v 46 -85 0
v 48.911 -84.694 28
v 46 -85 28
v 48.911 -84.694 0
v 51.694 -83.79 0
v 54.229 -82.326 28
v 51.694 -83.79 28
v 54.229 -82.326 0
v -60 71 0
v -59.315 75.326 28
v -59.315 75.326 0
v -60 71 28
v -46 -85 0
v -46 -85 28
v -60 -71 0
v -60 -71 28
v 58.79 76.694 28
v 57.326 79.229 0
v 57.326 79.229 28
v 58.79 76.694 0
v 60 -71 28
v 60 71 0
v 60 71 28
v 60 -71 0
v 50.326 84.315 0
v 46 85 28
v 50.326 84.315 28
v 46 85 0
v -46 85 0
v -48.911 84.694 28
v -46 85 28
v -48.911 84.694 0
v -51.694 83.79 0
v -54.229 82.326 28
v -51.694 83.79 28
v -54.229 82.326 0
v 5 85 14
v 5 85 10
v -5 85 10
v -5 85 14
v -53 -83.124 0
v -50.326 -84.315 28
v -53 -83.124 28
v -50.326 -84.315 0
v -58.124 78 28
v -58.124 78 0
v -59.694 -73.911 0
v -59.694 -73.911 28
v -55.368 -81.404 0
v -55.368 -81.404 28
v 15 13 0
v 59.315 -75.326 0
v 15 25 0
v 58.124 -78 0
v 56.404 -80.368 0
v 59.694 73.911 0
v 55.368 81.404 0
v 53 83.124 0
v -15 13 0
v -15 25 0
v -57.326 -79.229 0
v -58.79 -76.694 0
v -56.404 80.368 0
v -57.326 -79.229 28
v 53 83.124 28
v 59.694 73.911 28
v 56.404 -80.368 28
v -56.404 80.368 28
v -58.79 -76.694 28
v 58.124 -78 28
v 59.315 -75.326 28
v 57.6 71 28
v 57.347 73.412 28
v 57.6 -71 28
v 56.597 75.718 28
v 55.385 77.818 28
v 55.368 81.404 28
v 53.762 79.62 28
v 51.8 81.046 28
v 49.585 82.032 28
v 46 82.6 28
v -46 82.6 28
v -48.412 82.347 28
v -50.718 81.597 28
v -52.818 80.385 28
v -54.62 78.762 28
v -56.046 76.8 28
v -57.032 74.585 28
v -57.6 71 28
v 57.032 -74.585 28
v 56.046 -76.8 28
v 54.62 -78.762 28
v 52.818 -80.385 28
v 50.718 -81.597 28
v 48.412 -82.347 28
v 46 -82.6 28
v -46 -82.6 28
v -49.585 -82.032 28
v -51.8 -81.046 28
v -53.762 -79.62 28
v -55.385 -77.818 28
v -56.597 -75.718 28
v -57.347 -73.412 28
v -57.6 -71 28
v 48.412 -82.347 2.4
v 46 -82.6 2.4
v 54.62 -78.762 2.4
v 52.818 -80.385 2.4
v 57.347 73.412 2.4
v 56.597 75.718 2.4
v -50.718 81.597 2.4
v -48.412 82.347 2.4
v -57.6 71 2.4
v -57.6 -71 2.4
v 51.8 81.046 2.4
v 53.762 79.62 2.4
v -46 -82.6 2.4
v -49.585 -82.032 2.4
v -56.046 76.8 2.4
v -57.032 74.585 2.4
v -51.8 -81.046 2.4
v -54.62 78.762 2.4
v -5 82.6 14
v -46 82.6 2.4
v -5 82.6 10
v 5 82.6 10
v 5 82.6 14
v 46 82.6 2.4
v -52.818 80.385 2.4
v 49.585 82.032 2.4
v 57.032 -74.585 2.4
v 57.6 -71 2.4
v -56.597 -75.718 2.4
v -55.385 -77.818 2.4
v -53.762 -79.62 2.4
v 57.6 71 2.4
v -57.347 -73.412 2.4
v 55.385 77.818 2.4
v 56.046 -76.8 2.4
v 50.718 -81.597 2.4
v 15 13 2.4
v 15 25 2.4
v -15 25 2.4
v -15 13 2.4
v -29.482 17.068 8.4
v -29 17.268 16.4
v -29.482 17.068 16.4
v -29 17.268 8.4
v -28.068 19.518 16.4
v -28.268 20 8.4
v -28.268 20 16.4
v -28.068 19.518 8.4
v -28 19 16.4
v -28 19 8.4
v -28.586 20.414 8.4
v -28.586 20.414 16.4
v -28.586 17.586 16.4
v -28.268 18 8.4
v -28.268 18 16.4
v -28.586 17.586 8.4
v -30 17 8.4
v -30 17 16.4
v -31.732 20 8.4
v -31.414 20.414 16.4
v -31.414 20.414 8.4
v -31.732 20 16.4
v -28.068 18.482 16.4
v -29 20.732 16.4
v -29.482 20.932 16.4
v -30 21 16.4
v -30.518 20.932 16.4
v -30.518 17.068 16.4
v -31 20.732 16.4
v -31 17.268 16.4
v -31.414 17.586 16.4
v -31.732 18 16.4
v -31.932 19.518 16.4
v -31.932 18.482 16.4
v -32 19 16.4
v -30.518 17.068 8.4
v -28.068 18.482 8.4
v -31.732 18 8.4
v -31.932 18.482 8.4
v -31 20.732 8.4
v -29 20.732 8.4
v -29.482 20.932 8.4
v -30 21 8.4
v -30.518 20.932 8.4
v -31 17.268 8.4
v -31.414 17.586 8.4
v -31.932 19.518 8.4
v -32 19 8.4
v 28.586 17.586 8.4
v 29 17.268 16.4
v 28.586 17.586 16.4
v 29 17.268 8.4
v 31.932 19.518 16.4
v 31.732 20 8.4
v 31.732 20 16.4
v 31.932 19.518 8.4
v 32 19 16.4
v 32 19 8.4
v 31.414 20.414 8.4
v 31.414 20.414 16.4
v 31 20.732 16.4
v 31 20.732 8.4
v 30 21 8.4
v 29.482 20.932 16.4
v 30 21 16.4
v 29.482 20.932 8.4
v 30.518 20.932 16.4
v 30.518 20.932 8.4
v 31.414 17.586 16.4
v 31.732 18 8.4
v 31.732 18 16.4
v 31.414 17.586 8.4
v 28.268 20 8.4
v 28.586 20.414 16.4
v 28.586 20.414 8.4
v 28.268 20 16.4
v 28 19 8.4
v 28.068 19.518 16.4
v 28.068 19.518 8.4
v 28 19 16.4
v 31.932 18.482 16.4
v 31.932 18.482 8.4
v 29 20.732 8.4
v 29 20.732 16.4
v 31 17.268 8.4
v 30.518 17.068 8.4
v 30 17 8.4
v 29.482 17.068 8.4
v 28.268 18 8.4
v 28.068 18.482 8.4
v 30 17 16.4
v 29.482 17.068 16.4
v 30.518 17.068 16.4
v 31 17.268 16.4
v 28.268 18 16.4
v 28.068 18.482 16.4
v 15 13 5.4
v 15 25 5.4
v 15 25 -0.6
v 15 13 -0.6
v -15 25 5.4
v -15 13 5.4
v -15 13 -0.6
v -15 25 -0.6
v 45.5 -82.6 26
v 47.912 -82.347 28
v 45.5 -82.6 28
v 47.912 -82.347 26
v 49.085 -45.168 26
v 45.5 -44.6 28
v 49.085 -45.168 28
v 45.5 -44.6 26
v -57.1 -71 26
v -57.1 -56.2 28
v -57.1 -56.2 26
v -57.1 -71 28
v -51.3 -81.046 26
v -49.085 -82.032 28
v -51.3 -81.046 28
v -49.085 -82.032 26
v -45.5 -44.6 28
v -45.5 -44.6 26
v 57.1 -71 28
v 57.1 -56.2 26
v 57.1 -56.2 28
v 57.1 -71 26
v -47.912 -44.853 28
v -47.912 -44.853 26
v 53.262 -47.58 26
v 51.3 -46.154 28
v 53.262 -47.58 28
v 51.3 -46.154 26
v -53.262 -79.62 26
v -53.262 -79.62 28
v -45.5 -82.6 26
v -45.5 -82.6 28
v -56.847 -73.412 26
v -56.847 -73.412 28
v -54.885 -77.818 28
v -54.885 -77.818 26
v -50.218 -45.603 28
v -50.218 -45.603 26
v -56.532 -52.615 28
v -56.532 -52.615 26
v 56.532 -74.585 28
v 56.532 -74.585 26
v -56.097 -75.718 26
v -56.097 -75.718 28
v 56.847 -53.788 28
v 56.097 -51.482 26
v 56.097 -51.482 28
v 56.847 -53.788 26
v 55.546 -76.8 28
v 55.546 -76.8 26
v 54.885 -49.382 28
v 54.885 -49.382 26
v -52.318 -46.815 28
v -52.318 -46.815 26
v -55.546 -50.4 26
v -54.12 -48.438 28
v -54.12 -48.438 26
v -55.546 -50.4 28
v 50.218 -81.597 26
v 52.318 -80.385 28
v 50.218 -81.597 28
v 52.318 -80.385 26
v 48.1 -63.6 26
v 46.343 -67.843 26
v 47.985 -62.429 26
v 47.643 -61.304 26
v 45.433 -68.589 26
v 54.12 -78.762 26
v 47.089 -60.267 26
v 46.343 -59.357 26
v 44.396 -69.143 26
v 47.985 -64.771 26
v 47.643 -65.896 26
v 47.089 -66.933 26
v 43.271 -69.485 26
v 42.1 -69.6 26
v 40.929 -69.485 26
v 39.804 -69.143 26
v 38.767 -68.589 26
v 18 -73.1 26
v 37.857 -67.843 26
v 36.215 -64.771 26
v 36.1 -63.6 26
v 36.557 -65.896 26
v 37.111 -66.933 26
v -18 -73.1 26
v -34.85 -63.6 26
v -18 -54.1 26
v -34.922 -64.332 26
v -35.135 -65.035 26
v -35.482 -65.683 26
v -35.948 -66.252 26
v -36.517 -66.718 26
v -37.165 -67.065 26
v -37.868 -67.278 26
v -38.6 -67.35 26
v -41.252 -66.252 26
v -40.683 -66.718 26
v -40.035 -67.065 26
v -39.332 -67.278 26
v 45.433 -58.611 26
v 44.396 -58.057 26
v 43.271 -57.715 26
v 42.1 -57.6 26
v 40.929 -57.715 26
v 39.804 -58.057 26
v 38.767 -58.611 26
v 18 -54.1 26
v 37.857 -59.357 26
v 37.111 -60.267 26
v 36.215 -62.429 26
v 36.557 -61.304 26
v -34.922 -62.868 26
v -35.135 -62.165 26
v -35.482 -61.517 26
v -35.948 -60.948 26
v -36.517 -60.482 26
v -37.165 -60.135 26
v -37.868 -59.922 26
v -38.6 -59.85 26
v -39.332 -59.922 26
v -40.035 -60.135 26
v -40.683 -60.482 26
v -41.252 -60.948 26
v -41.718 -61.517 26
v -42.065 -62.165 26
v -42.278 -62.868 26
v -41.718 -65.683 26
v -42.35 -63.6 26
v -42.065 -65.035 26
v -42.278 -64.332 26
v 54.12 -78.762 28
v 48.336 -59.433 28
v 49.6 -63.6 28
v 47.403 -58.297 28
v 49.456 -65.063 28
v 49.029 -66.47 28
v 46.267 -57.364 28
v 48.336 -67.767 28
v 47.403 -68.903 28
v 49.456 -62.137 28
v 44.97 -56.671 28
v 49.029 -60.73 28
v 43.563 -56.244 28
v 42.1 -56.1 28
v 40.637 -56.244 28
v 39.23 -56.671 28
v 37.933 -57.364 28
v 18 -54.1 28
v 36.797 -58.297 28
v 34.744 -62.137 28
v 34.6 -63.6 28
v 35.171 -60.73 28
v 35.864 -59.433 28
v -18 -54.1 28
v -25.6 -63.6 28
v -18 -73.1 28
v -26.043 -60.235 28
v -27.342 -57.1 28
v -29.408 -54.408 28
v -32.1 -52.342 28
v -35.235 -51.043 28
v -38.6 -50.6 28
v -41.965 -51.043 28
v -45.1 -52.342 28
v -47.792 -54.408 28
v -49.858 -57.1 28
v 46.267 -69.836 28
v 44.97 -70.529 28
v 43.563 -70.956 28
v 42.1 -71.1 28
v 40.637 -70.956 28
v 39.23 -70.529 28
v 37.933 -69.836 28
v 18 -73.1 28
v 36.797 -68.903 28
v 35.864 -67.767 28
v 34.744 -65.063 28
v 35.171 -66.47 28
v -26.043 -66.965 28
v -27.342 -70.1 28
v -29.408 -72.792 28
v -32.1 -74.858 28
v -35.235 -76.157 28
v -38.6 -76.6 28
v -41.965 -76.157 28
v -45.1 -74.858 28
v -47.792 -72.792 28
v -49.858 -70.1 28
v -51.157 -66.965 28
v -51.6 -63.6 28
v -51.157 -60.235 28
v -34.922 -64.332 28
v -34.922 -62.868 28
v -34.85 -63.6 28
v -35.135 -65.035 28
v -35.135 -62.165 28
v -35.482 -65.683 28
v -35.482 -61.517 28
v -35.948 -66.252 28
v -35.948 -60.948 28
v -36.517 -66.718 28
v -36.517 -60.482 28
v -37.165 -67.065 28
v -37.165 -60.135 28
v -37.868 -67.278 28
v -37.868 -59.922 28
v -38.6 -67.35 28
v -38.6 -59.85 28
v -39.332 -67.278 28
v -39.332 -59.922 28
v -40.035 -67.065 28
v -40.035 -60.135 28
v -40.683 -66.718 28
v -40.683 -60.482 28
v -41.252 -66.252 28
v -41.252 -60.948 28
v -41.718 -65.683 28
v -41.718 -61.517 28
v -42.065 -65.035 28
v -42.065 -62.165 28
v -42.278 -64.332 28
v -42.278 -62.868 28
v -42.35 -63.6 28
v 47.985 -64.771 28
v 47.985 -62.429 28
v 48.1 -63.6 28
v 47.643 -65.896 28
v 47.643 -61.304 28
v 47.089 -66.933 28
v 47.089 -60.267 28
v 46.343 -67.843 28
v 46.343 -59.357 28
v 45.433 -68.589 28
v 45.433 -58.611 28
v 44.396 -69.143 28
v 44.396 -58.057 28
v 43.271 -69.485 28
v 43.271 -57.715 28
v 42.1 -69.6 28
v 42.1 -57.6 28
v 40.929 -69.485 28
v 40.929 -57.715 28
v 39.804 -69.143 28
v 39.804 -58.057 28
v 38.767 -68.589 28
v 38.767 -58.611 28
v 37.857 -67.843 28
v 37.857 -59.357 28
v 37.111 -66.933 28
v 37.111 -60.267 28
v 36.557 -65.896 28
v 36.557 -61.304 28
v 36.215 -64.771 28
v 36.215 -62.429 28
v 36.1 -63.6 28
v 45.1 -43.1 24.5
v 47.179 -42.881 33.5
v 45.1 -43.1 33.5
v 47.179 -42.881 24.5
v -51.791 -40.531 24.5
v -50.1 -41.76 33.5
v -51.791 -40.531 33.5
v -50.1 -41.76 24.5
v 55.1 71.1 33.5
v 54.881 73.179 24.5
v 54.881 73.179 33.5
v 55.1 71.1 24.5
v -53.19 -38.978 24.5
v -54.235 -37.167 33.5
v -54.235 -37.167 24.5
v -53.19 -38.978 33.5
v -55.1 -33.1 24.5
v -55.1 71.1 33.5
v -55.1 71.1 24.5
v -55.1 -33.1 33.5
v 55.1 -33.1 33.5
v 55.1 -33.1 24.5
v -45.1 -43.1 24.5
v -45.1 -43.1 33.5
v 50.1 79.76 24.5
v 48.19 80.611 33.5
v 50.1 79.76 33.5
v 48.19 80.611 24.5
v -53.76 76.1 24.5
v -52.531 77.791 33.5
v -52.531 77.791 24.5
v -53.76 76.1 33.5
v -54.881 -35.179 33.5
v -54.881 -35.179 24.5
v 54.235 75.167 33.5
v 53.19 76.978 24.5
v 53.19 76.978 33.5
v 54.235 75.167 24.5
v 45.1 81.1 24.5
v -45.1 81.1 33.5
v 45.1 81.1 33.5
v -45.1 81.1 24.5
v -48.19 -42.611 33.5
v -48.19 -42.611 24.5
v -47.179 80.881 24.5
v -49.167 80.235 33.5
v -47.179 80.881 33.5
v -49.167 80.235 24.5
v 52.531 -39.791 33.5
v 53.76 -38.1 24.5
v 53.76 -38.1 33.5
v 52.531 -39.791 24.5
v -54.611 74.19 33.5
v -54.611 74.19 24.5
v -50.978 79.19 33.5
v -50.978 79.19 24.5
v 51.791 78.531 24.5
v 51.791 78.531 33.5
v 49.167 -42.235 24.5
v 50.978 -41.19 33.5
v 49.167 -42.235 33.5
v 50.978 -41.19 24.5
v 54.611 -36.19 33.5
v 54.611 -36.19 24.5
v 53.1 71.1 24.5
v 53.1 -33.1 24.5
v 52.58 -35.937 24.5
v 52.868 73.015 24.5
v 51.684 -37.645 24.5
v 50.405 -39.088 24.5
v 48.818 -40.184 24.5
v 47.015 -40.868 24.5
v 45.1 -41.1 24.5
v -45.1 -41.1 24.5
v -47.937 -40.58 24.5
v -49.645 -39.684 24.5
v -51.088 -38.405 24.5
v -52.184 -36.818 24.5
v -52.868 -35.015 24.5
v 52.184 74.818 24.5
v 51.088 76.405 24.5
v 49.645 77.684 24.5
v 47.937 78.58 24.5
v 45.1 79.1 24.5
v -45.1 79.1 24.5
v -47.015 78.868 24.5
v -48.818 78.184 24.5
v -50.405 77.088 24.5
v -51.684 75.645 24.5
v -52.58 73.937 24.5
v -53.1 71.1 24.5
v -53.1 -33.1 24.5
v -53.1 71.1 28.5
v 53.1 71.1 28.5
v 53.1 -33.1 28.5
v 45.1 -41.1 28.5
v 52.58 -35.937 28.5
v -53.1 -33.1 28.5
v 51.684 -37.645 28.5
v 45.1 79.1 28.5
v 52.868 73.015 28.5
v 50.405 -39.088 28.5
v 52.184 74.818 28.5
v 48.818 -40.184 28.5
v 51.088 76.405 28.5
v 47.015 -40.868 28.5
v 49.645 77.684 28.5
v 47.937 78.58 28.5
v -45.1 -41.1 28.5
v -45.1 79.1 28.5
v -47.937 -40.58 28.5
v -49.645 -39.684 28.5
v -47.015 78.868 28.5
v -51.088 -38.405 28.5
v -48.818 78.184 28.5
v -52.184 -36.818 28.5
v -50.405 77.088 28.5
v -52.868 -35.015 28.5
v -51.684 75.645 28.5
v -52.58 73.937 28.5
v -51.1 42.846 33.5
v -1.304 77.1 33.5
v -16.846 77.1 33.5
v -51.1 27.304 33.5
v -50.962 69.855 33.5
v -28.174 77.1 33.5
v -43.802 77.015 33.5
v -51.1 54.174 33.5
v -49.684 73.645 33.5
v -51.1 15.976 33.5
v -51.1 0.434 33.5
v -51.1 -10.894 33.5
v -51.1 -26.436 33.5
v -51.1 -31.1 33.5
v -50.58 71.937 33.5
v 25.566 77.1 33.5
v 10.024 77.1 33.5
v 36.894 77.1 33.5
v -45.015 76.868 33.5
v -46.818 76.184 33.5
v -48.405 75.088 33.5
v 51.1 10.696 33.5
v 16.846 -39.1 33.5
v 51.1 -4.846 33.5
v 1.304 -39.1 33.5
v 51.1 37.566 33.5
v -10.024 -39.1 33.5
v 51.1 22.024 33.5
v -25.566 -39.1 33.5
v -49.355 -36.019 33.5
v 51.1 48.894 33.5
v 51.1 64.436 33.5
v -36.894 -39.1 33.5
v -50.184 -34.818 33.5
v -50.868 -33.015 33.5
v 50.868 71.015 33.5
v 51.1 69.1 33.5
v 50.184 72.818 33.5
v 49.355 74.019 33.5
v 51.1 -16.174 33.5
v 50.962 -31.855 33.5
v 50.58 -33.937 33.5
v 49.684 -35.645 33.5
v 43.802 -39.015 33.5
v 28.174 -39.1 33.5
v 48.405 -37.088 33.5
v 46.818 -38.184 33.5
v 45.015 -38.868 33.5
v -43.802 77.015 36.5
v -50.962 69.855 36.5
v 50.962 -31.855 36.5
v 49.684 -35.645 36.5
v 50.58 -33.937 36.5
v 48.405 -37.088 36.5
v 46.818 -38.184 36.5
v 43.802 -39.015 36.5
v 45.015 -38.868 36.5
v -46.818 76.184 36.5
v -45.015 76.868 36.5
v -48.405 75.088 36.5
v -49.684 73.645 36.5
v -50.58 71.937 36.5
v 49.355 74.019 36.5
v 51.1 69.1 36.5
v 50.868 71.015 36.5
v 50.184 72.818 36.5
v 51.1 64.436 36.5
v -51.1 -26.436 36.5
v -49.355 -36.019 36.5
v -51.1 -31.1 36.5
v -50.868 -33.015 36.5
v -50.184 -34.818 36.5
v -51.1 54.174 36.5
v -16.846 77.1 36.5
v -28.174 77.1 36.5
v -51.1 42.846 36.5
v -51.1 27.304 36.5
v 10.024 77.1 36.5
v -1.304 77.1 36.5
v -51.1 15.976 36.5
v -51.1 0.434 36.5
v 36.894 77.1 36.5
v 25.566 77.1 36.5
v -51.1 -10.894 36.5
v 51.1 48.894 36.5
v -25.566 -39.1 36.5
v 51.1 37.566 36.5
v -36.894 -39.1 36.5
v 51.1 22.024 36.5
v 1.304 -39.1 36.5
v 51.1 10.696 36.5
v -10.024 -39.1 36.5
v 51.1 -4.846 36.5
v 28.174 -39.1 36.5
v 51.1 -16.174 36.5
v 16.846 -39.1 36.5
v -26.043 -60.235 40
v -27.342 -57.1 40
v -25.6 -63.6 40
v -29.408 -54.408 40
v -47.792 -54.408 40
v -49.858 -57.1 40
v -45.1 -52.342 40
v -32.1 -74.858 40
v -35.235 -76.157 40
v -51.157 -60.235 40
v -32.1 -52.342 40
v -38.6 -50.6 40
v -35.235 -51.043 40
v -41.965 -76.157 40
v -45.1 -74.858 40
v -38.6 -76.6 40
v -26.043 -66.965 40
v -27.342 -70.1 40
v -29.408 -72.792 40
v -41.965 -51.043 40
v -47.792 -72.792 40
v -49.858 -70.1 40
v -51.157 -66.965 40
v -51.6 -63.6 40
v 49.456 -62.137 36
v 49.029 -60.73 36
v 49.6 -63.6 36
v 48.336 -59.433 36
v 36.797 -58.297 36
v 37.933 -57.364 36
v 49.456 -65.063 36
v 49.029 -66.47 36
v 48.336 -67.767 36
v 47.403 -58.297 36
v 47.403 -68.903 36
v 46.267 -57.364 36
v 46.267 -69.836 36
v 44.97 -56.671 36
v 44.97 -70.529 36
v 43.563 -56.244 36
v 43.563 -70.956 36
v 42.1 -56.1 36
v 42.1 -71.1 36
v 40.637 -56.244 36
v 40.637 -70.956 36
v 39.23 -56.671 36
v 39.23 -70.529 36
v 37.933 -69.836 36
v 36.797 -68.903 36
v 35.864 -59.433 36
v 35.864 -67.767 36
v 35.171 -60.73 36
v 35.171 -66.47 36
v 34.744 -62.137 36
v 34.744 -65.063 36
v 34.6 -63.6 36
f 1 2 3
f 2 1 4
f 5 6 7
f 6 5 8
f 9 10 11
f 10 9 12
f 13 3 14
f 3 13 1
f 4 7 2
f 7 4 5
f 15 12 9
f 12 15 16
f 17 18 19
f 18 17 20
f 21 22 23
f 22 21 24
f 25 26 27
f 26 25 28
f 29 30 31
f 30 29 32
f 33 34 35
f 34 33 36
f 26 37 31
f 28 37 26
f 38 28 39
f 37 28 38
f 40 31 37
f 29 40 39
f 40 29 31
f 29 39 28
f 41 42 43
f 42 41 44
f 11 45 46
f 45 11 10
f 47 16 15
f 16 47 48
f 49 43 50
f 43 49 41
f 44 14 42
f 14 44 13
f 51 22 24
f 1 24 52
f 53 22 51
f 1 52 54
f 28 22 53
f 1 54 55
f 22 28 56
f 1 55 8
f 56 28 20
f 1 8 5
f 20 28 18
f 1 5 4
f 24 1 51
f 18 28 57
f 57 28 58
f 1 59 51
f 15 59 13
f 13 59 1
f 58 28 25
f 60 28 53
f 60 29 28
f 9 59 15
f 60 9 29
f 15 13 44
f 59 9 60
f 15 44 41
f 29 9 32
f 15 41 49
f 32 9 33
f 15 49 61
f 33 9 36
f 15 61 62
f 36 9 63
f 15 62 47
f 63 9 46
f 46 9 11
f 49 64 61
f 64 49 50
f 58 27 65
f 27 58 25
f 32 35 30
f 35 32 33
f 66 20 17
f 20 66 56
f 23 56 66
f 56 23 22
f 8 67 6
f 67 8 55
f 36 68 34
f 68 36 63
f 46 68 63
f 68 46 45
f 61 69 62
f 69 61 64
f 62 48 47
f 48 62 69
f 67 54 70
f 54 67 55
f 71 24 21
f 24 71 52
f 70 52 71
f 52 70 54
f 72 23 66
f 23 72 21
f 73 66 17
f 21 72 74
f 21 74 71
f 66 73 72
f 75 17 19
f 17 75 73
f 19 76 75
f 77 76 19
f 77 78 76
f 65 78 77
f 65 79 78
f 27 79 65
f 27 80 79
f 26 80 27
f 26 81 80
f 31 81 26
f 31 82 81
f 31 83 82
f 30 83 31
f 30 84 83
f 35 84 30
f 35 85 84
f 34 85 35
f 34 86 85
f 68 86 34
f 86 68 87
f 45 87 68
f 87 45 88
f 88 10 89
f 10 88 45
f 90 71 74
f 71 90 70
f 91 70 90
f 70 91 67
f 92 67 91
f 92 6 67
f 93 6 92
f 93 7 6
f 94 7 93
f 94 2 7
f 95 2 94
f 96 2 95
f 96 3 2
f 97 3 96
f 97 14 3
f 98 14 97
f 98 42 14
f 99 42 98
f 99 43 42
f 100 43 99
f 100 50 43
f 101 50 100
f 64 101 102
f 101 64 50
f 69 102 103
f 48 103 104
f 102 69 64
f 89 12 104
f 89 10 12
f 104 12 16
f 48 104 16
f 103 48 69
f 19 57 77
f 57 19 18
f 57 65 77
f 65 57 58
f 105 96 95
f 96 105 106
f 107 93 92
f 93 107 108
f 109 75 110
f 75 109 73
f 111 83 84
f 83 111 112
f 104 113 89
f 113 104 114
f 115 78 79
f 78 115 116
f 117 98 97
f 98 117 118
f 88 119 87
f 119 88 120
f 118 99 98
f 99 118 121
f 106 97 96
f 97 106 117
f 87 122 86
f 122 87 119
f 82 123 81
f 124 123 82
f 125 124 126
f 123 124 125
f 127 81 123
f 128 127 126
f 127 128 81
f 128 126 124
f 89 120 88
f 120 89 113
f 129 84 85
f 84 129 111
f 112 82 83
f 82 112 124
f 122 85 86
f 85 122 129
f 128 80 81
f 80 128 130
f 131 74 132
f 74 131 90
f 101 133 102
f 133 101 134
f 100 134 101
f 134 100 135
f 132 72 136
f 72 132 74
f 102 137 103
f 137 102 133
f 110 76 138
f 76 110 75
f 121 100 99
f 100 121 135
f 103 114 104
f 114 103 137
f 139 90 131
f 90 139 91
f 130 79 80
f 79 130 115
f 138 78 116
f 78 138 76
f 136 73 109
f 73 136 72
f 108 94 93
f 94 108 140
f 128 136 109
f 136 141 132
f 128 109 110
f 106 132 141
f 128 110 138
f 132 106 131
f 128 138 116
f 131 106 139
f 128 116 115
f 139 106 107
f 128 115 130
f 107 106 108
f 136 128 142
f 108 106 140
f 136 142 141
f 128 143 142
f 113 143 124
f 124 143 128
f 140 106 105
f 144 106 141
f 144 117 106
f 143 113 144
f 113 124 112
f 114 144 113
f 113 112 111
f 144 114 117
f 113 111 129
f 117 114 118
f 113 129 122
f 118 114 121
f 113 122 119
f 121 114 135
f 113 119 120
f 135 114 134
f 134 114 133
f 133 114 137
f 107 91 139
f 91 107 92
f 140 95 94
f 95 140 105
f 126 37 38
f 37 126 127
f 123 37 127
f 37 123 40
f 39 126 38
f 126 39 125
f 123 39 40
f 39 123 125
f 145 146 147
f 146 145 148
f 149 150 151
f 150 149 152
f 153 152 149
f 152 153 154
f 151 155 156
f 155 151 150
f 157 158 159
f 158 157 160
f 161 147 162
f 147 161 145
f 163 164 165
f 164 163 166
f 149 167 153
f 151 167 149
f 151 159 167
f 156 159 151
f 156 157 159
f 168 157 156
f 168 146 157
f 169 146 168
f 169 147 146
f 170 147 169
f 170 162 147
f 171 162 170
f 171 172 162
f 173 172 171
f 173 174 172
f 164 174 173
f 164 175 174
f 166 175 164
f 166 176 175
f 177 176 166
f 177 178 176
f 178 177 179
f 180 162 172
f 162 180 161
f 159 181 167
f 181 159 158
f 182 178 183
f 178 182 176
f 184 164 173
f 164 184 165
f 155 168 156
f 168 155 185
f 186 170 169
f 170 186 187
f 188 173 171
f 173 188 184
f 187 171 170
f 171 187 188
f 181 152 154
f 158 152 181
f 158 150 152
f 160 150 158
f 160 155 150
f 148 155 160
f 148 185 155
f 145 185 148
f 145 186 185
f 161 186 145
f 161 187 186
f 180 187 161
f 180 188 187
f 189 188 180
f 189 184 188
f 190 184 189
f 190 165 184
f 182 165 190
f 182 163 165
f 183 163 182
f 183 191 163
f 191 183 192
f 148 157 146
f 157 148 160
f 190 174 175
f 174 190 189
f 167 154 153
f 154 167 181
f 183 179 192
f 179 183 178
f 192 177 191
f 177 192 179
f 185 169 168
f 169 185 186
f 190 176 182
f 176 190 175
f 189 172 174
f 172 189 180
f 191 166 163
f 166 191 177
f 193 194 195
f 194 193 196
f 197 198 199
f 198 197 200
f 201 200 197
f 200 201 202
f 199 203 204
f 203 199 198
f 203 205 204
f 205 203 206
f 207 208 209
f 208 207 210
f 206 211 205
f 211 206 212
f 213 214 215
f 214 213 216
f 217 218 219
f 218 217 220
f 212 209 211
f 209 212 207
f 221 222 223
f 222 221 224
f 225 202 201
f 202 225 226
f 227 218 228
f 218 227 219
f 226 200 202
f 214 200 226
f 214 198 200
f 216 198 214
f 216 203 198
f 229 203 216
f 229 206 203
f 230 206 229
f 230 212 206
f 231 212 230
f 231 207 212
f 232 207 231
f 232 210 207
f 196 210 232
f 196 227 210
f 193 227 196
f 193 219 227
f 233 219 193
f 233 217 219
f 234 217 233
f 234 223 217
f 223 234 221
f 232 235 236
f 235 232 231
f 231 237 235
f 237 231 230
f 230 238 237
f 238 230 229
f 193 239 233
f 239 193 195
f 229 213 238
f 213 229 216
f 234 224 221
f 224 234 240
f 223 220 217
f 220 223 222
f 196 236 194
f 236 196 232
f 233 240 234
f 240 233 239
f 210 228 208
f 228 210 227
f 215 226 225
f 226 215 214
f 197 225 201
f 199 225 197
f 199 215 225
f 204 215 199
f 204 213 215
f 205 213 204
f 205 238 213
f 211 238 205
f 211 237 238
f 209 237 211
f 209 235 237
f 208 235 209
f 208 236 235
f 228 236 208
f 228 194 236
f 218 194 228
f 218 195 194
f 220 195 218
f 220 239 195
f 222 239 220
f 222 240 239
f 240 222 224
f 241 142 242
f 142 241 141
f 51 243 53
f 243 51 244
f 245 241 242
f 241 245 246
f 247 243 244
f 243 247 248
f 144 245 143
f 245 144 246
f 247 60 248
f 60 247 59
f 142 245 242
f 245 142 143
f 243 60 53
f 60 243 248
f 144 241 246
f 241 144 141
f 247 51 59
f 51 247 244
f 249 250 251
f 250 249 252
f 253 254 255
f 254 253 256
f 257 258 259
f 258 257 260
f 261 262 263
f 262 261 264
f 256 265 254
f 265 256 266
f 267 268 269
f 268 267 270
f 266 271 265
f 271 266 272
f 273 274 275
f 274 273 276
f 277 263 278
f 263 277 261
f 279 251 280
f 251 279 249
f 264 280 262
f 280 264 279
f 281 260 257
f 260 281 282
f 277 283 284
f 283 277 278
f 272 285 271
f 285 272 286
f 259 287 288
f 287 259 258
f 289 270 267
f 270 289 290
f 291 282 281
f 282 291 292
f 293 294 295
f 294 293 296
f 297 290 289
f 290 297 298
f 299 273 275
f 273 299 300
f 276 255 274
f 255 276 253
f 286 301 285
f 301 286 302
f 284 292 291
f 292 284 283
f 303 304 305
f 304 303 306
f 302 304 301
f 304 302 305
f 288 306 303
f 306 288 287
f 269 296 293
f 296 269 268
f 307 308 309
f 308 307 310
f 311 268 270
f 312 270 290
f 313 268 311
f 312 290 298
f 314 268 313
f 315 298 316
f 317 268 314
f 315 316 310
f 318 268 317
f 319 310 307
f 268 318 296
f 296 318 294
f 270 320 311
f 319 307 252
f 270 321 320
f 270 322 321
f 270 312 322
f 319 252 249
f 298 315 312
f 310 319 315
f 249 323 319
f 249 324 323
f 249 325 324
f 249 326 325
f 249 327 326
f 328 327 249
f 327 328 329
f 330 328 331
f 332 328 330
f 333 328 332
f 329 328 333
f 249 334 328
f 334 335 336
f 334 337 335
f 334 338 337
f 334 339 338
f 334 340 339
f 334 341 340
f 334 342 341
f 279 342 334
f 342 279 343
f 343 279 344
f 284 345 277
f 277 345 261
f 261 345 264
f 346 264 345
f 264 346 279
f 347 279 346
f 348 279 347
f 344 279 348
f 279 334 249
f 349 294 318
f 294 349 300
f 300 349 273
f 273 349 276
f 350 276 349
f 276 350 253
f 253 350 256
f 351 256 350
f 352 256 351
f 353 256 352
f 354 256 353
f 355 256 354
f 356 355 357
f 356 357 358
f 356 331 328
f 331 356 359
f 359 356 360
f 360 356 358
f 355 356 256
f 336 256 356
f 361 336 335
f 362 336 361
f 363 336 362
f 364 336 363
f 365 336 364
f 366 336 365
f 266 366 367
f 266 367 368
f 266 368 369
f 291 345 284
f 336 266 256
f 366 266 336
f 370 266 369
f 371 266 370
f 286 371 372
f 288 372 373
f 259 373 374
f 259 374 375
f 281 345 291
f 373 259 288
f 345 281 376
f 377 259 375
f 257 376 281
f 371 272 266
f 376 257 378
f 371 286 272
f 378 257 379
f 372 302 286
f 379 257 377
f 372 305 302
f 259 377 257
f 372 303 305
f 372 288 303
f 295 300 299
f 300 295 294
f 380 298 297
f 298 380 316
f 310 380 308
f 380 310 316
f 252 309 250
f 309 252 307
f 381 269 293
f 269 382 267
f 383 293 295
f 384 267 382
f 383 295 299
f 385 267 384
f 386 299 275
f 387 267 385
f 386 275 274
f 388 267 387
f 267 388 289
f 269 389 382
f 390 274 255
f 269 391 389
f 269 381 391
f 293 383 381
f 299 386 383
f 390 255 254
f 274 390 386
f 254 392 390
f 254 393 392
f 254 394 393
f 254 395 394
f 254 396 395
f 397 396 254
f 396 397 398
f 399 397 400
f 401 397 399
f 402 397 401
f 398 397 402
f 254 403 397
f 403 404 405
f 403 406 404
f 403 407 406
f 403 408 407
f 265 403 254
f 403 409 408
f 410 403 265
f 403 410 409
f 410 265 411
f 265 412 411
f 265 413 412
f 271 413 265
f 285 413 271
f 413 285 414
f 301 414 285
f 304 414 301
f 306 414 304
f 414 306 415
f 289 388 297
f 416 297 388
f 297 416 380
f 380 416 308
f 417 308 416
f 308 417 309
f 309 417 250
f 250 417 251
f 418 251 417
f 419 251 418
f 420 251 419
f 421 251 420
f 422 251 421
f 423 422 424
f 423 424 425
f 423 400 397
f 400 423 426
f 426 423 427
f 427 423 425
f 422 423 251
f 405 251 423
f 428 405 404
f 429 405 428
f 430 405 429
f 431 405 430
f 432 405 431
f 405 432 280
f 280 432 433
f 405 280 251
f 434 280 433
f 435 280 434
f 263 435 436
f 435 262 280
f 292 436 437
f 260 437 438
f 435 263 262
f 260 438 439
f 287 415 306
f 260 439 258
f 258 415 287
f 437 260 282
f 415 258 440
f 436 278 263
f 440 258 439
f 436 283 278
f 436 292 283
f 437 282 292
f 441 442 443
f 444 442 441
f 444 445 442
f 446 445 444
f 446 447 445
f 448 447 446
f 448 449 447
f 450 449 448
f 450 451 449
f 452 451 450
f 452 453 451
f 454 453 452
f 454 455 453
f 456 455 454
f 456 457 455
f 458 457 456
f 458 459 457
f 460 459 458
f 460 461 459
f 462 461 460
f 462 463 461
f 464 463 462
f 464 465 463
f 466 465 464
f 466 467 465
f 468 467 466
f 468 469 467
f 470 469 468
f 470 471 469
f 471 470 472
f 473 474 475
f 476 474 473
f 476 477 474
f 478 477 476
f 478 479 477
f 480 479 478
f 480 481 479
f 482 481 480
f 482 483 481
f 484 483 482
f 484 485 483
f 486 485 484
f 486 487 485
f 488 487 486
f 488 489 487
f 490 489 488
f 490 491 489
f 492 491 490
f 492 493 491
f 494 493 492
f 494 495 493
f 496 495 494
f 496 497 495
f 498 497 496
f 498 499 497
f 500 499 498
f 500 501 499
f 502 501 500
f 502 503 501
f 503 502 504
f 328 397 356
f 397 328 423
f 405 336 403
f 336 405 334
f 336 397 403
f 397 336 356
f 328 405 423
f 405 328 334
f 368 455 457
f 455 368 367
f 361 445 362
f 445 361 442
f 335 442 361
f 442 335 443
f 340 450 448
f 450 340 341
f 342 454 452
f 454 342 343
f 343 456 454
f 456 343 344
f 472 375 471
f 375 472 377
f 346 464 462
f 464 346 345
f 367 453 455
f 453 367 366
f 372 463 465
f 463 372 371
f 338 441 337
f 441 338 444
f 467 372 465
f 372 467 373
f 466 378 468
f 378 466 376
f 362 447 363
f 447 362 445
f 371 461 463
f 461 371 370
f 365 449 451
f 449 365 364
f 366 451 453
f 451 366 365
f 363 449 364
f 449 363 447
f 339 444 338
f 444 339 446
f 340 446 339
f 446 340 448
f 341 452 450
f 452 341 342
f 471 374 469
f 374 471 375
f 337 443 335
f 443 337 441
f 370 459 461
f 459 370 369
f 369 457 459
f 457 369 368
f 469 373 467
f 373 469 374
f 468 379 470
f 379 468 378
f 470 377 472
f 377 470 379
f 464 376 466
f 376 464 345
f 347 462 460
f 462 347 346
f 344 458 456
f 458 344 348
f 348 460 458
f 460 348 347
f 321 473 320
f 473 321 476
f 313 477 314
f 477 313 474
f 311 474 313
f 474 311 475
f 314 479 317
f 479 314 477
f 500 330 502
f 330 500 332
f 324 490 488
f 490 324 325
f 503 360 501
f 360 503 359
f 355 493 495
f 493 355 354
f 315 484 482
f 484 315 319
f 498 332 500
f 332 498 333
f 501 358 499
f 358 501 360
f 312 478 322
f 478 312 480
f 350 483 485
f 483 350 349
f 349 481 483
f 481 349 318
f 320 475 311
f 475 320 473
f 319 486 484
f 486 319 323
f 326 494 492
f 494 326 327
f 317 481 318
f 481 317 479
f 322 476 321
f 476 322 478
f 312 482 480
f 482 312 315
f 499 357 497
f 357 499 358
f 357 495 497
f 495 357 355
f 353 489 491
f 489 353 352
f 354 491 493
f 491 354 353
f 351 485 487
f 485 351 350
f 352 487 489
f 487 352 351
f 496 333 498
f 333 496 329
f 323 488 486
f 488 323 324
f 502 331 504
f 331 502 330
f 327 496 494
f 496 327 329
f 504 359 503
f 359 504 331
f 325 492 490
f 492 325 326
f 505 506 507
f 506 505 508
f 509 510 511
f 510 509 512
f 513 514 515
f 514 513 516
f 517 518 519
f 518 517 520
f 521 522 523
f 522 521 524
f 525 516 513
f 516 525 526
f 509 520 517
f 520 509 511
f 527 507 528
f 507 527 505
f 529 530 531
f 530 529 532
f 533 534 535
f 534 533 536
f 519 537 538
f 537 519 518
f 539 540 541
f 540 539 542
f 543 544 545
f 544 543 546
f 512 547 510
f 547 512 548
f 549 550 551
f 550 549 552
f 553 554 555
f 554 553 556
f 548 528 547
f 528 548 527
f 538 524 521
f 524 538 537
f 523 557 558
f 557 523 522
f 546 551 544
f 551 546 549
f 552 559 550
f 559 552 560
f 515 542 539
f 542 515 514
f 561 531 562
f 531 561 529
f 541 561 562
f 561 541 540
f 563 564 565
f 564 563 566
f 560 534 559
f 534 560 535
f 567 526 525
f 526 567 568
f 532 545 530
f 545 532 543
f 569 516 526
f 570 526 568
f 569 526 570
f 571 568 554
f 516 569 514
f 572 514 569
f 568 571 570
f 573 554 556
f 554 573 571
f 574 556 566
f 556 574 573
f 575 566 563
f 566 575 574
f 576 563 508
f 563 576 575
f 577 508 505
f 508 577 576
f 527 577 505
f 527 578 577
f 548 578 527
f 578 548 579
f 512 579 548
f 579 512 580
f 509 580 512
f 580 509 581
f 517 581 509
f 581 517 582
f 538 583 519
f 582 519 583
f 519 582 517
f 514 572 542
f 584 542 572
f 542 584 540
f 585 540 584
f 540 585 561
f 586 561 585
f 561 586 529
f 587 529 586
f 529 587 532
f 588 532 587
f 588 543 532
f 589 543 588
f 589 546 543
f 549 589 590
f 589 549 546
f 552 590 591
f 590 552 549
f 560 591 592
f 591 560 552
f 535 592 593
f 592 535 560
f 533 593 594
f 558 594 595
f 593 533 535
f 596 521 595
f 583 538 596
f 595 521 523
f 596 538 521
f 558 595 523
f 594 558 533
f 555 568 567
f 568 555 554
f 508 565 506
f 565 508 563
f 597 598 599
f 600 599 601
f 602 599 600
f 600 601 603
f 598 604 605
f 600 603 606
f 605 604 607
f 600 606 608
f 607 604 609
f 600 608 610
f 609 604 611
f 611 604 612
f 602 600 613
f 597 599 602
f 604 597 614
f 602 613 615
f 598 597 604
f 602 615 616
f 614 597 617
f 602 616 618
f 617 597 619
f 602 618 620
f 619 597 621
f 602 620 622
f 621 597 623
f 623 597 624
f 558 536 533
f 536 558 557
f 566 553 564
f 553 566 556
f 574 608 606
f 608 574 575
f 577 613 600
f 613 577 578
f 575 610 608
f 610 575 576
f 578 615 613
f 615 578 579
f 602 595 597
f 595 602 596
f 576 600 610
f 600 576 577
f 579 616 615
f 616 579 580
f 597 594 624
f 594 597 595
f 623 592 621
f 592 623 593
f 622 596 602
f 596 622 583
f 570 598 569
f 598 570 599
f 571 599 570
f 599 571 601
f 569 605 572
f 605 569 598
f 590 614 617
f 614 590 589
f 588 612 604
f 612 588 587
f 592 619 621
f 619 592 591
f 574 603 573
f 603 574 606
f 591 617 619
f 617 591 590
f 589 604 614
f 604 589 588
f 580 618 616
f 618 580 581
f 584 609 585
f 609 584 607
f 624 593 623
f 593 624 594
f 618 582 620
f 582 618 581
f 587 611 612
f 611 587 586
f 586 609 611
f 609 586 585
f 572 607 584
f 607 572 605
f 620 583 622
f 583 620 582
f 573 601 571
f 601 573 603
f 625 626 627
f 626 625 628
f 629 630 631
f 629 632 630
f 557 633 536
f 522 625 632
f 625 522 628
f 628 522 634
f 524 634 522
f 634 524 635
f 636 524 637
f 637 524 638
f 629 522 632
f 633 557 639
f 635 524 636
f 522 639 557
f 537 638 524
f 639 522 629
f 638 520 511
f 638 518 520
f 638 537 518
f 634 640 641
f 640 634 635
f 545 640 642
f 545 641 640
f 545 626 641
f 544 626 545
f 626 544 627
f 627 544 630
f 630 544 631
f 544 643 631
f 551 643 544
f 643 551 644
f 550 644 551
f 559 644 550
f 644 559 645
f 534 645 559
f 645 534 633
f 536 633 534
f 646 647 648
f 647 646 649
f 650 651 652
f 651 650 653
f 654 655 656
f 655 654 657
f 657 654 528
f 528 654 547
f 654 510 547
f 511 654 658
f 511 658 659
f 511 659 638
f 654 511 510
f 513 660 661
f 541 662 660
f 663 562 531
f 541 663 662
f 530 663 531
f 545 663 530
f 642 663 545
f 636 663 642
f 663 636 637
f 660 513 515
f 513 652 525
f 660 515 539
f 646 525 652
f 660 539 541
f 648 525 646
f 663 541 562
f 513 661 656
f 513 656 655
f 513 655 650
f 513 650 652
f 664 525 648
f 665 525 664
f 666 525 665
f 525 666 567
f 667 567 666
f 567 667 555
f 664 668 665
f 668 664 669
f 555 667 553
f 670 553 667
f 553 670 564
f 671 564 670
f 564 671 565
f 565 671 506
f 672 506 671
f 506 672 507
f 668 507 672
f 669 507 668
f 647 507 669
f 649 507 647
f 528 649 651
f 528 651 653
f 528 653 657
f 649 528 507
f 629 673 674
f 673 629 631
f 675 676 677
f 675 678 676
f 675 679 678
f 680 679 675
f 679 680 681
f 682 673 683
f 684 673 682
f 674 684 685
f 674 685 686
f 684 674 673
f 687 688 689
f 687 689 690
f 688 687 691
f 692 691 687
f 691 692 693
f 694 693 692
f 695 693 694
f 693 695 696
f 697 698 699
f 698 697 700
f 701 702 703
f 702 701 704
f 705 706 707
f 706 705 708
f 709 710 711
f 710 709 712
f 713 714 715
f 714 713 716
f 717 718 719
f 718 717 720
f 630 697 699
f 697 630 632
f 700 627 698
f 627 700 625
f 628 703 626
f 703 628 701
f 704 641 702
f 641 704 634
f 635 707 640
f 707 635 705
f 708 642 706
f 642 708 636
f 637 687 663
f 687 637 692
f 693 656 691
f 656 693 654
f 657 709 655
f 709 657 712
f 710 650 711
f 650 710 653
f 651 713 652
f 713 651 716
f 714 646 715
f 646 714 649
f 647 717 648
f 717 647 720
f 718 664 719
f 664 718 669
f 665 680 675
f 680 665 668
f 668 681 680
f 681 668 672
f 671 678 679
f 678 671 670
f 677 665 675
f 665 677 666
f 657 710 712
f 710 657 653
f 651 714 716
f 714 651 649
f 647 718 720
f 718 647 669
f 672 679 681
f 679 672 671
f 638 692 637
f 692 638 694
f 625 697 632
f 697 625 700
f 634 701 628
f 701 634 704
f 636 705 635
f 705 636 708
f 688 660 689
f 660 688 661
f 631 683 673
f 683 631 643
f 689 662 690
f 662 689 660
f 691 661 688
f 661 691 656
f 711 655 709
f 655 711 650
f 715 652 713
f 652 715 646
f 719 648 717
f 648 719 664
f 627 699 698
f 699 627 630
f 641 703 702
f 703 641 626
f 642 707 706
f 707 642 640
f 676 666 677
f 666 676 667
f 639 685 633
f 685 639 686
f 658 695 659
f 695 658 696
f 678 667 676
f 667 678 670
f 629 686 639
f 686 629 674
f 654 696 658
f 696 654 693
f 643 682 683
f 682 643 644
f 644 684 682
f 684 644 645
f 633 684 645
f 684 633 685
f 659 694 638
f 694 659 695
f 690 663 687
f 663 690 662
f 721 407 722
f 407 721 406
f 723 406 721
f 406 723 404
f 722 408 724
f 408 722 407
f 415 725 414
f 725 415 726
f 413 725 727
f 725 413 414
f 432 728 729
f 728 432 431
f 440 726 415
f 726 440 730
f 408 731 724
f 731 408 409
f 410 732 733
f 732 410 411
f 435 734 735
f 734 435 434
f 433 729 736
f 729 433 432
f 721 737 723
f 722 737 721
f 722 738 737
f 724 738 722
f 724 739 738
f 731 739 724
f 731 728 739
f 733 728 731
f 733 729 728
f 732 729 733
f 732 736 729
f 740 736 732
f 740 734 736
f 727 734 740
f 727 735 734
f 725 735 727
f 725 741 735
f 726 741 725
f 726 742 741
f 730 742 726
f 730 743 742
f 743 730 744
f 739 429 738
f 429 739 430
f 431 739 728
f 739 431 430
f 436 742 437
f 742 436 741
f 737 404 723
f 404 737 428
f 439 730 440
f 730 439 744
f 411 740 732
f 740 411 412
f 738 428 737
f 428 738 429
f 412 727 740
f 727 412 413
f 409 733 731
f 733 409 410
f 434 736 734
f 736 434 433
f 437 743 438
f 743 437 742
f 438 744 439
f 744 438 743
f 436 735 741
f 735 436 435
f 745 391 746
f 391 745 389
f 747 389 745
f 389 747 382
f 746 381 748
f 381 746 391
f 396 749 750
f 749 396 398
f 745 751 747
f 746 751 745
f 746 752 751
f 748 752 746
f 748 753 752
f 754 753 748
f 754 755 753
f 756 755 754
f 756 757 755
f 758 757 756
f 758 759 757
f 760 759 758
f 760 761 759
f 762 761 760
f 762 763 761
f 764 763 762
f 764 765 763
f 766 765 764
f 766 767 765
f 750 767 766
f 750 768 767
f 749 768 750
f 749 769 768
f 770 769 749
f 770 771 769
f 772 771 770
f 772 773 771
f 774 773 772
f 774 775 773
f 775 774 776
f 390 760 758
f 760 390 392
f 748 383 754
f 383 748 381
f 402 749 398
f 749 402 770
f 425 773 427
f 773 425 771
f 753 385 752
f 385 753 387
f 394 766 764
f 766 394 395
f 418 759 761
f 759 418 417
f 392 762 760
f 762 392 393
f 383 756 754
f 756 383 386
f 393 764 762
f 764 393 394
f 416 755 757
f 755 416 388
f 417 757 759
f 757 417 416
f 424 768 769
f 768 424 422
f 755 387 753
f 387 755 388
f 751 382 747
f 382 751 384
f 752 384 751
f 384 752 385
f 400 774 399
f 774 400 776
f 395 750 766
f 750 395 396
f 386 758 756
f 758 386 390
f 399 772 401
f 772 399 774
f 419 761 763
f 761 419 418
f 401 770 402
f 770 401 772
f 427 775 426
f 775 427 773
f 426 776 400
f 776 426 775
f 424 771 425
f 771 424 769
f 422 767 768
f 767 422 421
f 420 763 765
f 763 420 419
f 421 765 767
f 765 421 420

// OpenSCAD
// Báscula de café v2 - inspirada en la distribución del Water Tracker
// (plataforma con nervios + franja de control con pantalla, pomo y botón)
pieza = "todo"; // "base" | "panel" | "plataforma" | "nervios" | "pomo" | "boton" | "todo"

W = 120;  D = 170;  H = 28;  R = 14;   // carcasa
pared = 2.4;
panel_d = 38;                 // fondo de la franja de control (frente)
gap = 1.5;                    // holgura plataforma-panel
plat_w = W - 2*pared - 2*gap - 2;
plat_d = D - panel_d - 2*pared - 2*gap;
plat_t = 5;
// pantalla LCD 1.47" (172x320, vertical, se monta horizontal)
disp_w = 36; disp_h = 19;     // ventana visible
// pomo (encoder) y botón
pomo_d = 26; boton_d = 15;
nervio_w = 8; nervio_h = 3; paso = 19;

module rrect(w,d,h,r){ linear_extrude(h) offset(r) square([w-2*r,d-2*r],center=true); }

module base() {
  difference() {
    rrect(W,D,H,R);
    translate([0,0,pared]) rrect(W-2*pared,D-2*pared,H,R-pared);
    translate([0,D/2-1,12]) cube([10,8,4],center=true);        // USB-C trasero
  }
  // soporte celda de carga (zona de la plataforma)
  translate([0,(panel_d)/2,pared]) cube([30,12,6],center=true);
  // topes de sobrecarga
  for (x=[-1,1]) translate([x*30,panel_d/2,pared+6]) cylinder(d=4,h=8,$fn=24);
}

module panel() {   // pieza negra del frente, al ras de la carcasa
  translate([0,-D/2+panel_d/2+pared,H-2]) difference() {
    rrect(W-2*pared-1, panel_d, 2, R-pared);
    translate([0,0,-1]) cube([disp_w,disp_h,6],center=true);                    // pantalla
    translate([-(W/2-pared-pomo_d/2-6),0,-1]) cylinder(d=7.5,h=6,$fn=32);       // eje encoder
    translate([ (W/2-pared-boton_d/2-8),0,-1]) cylinder(d=boton_d-3,h=6,$fn=32);// botón
  }
}

module plataforma() {   // flota sobre la celda
  rrect(plat_w, plat_d, plat_t, 10);
  translate([0,0,-4]) difference(){
    rrect(plat_w, plat_d, 4, 10);
    translate([0,0,-1]) rrect(plat_w-4, plat_d-4, 6, 8);
  }
}

module nervios() {      // nervios diagonales rojos (soporte de taza + antideslizante)
  intersection() {
    translate([0,0,plat_t]) rrect(plat_w-8, plat_d-8, nervio_h, 8);
    for (i=[-8:8]) translate([0,0,plat_t]) rotate(-45)
      translate([i*paso,0,0]) linear_extrude(nervio_h)
        offset(nervio_w/2) square([0.01, 220-abs(i)*12],center=true);
  }
}

module pomo()  { cylinder(d=pomo_d,h=12,$fn=24); }
module boton() { cylinder(d=boton_d,h=8,$fn=32); }

if (pieza=="base") base();
else if (pieza=="panel") panel();
else if (pieza=="plataforma") plataforma();
else if (pieza=="nervios") nervios();
else if (pieza=="pomo") pomo();
else if (pieza=="boton") boton();
else {
  color("#e8e8e8") base();
  color("#1a1a1a") panel();
  color("#f2efe6") translate([0,panel_d/2,H+gap-1]) plataforma();
  color("#d62d2d") translate([0,panel_d/2,H+gap-1]) nervios();
  color("#f5c518") translate([-(W/2-pared-pomo_d/2-6),-D/2+panel_d/2+pared,H]) pomo();
  color("#2a6fdb") translate([ (W/2-pared-boton_d/2-8),-D/2+panel_d/2+pared,H]) boton();
}
